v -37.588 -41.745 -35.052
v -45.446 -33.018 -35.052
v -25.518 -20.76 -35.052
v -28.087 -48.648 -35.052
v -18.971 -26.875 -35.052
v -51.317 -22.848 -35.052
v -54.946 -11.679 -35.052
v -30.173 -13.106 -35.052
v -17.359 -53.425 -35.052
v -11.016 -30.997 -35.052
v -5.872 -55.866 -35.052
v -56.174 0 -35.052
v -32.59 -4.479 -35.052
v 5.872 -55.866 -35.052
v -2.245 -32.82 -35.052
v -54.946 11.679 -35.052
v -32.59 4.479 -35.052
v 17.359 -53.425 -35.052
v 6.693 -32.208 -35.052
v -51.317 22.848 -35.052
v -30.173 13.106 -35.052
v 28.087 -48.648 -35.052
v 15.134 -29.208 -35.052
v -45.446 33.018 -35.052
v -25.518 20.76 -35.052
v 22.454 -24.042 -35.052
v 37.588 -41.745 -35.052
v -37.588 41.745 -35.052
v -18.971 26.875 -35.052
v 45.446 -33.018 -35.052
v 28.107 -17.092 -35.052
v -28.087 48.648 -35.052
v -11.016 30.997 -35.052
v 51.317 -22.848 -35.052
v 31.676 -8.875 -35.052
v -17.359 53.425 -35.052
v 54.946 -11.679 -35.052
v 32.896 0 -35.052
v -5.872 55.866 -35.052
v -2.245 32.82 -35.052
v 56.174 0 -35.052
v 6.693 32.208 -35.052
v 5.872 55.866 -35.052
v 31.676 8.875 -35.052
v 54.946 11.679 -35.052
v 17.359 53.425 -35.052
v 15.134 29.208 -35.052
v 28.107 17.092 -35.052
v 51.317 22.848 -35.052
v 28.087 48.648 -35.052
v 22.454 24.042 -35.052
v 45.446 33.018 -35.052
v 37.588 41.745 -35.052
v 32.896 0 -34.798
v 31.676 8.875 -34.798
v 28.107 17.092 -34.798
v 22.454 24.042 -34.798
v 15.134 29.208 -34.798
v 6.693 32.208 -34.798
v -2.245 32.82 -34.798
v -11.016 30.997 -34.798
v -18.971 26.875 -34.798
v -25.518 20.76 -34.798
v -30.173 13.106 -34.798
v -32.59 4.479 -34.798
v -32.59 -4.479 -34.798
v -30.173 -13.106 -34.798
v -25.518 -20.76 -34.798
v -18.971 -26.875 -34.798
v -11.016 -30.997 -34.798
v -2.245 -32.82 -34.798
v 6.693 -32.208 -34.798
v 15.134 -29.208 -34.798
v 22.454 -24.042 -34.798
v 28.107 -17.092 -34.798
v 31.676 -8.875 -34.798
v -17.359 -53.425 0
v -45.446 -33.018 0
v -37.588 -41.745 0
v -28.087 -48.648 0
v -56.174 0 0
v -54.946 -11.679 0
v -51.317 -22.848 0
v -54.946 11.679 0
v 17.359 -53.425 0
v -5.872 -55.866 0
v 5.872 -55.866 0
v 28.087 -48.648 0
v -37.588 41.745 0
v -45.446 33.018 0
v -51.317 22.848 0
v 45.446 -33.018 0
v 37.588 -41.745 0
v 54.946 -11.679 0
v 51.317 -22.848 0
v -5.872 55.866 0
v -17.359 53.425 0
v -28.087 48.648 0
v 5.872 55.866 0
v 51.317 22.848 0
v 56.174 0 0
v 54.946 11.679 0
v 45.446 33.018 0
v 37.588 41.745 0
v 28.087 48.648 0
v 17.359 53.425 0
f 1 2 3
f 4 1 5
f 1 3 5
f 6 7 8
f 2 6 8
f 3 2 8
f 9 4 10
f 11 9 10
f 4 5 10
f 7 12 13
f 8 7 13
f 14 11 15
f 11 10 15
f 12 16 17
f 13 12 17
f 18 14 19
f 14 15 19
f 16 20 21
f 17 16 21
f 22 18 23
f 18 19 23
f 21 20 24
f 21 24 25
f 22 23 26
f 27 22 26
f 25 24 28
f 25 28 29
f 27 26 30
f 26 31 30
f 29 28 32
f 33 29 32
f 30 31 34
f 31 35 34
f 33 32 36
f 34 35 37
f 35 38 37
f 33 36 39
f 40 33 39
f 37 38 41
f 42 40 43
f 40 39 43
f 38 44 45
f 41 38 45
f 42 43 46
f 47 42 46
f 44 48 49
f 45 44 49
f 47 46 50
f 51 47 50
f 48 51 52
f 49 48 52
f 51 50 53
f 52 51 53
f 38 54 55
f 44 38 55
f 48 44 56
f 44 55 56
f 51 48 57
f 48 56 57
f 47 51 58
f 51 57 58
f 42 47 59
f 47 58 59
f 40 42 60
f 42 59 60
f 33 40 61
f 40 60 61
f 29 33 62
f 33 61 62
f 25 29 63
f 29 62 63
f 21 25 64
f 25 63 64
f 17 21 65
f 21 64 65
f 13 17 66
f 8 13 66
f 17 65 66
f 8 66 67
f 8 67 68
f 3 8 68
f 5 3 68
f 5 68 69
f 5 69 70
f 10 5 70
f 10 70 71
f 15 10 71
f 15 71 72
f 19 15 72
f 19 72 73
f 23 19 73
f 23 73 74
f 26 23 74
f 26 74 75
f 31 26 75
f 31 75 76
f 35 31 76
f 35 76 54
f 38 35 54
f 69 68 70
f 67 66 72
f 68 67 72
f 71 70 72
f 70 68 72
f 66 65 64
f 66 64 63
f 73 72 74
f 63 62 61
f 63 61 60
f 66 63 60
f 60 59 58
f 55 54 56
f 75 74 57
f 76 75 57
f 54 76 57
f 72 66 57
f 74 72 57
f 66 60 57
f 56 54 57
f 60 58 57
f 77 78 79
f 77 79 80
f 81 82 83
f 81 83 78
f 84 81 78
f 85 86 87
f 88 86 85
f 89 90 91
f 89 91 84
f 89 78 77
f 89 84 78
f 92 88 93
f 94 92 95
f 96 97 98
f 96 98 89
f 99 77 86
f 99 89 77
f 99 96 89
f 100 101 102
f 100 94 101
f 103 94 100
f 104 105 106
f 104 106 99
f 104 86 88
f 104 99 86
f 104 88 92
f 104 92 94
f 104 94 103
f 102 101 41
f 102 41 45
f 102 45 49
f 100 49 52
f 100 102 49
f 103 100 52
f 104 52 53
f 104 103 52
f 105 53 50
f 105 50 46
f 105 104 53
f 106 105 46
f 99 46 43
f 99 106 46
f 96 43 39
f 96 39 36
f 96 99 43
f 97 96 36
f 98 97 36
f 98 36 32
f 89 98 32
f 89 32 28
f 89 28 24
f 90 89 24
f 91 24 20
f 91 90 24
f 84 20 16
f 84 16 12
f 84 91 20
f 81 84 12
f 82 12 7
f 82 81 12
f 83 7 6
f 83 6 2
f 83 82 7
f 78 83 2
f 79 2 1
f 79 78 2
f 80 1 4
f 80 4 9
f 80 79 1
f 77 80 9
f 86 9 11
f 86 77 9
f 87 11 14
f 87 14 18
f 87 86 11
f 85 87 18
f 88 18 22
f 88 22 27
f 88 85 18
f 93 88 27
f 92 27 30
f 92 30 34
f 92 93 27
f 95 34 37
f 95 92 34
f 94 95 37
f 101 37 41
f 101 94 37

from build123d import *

# Parameters (mm, degrees)
F0_R     = 56.1739618702
F0_R_2   = 32.8963638887
F1_DEPTH = 35.052
F2_DEPTH = 34.798
F0_R_3   = 4.9490742643
F3_DEPTH = 34.798


with BuildPart() as f1:
    # F0 (on Top) → F1 (new body)
    with BuildSketch(Plane.XY):
        Circle(F0_R)
        Circle(F0_R_2, mode=Mode.SUBTRACT)
    extrude(amount=-F1_DEPTH)

    # F0 (on Top) → F2 (join)
    with BuildSketch(Plane.XY):
        Circle(F0_R_2)
        Polygon((24.0832565908, 15.5113956786), (25.4748910012, -13.1010141742), (1.3916344104, -28.6124098528), (-24.0832565908, -15.5113956786), (-25.4748910012, 13.1010141742), (-1.3916344104, 28.6124098528), align=None, mode=Mode.SUBTRACT)
    extrude(amount=-F2_DEPTH)

    # F0 (on Top) → F3 (join)
    with BuildSketch(Plane.XY):
        Polygon((1.3916344104, -28.6124098528), (25.4748910012, -13.1010141742), (24.0832565908, 15.5113956786), (-1.3916344104, 28.6124098528), (-25.4748910012, 13.1010141742), (-24.0832565908, -15.5113956786), align=None)
        Polygon((24.0832565908, 0), (12.0416282954, -20.8567120135), (-12.0416282954, -20.8567120135), (-24.0832565908, 0), (-12.0416282954, 20.8567120135), (12.0416282954, 20.8567120135), align=None, mode=Mode.SUBTRACT)
        Polygon((-12.0416282954, -20.8567120135), (12.0416282954, -20.8567120135), (24.0832565908, 0), (12.0416282954, 20.8567120135), (-12.0416282954, 20.8567120135), (-24.0832565908, 0), align=None)
        Polygon((16.4439717338, 11.0949333309), (17.8304799848, -8.6934305952), (1.3865082509, -19.7883639261), (-16.4439717338, -11.0949333309), (-17.8304799848, 8.6934305952), (-1.3865082509, 19.7883639261), align=None, mode=Mode.SUBTRACT)
        Polygon((1.3865082509, -19.7883639261), (17.8304799848, -8.6934305952), (16.4439717338, 11.0949333309), (-1.3865082509, 19.7883639261), (-17.8304799848, 8.6934305952), (-16.4439717338, -11.0949333309), align=None)
        Polygon((15.2503329708, 0), (7.6251664854, -13.2071757689), (-7.6251664854, -13.2071757689), (-15.2503329708, 0), (-7.6251664854, 13.2071757689), (7.6251664854, 13.2071757689), align=None, mode=Mode.SUBTRACT)
        Polygon((-7.6251664854, -13.2071757689), (7.6251664854, -13.2071757689), (15.2503329708, 0), (7.6251664854, 13.2071757689), (-7.6251664854, 13.2071757689), (-15.2503329708, 0), align=None)
        Polygon((9.7878324796, 4.5358240732), (8.8220551142, -6.2085995387), (-0.9657773653, -10.7444236119), (-9.7878324796, -4.5358240732), (-8.8220551142, 6.2085995387), (0.9657773653, 10.7444236119), align=None, mode=Mode.SUBTRACT)
        Polygon((-0.9657773653, -10.7444236119), (8.8220551142, -6.2085995387), (9.7878324796, 4.5358240732), (0.9657773653, 10.7444236119), (-8.8220551142, 6.2085995387), (-9.7878324796, -4.5358240732), align=None)
        Circle(F0_R_3, mode=Mode.SUBTRACT)
        Circle(F0_R_3)
    extrude(amount=-F3_DEPTH)


solid = f1.part
